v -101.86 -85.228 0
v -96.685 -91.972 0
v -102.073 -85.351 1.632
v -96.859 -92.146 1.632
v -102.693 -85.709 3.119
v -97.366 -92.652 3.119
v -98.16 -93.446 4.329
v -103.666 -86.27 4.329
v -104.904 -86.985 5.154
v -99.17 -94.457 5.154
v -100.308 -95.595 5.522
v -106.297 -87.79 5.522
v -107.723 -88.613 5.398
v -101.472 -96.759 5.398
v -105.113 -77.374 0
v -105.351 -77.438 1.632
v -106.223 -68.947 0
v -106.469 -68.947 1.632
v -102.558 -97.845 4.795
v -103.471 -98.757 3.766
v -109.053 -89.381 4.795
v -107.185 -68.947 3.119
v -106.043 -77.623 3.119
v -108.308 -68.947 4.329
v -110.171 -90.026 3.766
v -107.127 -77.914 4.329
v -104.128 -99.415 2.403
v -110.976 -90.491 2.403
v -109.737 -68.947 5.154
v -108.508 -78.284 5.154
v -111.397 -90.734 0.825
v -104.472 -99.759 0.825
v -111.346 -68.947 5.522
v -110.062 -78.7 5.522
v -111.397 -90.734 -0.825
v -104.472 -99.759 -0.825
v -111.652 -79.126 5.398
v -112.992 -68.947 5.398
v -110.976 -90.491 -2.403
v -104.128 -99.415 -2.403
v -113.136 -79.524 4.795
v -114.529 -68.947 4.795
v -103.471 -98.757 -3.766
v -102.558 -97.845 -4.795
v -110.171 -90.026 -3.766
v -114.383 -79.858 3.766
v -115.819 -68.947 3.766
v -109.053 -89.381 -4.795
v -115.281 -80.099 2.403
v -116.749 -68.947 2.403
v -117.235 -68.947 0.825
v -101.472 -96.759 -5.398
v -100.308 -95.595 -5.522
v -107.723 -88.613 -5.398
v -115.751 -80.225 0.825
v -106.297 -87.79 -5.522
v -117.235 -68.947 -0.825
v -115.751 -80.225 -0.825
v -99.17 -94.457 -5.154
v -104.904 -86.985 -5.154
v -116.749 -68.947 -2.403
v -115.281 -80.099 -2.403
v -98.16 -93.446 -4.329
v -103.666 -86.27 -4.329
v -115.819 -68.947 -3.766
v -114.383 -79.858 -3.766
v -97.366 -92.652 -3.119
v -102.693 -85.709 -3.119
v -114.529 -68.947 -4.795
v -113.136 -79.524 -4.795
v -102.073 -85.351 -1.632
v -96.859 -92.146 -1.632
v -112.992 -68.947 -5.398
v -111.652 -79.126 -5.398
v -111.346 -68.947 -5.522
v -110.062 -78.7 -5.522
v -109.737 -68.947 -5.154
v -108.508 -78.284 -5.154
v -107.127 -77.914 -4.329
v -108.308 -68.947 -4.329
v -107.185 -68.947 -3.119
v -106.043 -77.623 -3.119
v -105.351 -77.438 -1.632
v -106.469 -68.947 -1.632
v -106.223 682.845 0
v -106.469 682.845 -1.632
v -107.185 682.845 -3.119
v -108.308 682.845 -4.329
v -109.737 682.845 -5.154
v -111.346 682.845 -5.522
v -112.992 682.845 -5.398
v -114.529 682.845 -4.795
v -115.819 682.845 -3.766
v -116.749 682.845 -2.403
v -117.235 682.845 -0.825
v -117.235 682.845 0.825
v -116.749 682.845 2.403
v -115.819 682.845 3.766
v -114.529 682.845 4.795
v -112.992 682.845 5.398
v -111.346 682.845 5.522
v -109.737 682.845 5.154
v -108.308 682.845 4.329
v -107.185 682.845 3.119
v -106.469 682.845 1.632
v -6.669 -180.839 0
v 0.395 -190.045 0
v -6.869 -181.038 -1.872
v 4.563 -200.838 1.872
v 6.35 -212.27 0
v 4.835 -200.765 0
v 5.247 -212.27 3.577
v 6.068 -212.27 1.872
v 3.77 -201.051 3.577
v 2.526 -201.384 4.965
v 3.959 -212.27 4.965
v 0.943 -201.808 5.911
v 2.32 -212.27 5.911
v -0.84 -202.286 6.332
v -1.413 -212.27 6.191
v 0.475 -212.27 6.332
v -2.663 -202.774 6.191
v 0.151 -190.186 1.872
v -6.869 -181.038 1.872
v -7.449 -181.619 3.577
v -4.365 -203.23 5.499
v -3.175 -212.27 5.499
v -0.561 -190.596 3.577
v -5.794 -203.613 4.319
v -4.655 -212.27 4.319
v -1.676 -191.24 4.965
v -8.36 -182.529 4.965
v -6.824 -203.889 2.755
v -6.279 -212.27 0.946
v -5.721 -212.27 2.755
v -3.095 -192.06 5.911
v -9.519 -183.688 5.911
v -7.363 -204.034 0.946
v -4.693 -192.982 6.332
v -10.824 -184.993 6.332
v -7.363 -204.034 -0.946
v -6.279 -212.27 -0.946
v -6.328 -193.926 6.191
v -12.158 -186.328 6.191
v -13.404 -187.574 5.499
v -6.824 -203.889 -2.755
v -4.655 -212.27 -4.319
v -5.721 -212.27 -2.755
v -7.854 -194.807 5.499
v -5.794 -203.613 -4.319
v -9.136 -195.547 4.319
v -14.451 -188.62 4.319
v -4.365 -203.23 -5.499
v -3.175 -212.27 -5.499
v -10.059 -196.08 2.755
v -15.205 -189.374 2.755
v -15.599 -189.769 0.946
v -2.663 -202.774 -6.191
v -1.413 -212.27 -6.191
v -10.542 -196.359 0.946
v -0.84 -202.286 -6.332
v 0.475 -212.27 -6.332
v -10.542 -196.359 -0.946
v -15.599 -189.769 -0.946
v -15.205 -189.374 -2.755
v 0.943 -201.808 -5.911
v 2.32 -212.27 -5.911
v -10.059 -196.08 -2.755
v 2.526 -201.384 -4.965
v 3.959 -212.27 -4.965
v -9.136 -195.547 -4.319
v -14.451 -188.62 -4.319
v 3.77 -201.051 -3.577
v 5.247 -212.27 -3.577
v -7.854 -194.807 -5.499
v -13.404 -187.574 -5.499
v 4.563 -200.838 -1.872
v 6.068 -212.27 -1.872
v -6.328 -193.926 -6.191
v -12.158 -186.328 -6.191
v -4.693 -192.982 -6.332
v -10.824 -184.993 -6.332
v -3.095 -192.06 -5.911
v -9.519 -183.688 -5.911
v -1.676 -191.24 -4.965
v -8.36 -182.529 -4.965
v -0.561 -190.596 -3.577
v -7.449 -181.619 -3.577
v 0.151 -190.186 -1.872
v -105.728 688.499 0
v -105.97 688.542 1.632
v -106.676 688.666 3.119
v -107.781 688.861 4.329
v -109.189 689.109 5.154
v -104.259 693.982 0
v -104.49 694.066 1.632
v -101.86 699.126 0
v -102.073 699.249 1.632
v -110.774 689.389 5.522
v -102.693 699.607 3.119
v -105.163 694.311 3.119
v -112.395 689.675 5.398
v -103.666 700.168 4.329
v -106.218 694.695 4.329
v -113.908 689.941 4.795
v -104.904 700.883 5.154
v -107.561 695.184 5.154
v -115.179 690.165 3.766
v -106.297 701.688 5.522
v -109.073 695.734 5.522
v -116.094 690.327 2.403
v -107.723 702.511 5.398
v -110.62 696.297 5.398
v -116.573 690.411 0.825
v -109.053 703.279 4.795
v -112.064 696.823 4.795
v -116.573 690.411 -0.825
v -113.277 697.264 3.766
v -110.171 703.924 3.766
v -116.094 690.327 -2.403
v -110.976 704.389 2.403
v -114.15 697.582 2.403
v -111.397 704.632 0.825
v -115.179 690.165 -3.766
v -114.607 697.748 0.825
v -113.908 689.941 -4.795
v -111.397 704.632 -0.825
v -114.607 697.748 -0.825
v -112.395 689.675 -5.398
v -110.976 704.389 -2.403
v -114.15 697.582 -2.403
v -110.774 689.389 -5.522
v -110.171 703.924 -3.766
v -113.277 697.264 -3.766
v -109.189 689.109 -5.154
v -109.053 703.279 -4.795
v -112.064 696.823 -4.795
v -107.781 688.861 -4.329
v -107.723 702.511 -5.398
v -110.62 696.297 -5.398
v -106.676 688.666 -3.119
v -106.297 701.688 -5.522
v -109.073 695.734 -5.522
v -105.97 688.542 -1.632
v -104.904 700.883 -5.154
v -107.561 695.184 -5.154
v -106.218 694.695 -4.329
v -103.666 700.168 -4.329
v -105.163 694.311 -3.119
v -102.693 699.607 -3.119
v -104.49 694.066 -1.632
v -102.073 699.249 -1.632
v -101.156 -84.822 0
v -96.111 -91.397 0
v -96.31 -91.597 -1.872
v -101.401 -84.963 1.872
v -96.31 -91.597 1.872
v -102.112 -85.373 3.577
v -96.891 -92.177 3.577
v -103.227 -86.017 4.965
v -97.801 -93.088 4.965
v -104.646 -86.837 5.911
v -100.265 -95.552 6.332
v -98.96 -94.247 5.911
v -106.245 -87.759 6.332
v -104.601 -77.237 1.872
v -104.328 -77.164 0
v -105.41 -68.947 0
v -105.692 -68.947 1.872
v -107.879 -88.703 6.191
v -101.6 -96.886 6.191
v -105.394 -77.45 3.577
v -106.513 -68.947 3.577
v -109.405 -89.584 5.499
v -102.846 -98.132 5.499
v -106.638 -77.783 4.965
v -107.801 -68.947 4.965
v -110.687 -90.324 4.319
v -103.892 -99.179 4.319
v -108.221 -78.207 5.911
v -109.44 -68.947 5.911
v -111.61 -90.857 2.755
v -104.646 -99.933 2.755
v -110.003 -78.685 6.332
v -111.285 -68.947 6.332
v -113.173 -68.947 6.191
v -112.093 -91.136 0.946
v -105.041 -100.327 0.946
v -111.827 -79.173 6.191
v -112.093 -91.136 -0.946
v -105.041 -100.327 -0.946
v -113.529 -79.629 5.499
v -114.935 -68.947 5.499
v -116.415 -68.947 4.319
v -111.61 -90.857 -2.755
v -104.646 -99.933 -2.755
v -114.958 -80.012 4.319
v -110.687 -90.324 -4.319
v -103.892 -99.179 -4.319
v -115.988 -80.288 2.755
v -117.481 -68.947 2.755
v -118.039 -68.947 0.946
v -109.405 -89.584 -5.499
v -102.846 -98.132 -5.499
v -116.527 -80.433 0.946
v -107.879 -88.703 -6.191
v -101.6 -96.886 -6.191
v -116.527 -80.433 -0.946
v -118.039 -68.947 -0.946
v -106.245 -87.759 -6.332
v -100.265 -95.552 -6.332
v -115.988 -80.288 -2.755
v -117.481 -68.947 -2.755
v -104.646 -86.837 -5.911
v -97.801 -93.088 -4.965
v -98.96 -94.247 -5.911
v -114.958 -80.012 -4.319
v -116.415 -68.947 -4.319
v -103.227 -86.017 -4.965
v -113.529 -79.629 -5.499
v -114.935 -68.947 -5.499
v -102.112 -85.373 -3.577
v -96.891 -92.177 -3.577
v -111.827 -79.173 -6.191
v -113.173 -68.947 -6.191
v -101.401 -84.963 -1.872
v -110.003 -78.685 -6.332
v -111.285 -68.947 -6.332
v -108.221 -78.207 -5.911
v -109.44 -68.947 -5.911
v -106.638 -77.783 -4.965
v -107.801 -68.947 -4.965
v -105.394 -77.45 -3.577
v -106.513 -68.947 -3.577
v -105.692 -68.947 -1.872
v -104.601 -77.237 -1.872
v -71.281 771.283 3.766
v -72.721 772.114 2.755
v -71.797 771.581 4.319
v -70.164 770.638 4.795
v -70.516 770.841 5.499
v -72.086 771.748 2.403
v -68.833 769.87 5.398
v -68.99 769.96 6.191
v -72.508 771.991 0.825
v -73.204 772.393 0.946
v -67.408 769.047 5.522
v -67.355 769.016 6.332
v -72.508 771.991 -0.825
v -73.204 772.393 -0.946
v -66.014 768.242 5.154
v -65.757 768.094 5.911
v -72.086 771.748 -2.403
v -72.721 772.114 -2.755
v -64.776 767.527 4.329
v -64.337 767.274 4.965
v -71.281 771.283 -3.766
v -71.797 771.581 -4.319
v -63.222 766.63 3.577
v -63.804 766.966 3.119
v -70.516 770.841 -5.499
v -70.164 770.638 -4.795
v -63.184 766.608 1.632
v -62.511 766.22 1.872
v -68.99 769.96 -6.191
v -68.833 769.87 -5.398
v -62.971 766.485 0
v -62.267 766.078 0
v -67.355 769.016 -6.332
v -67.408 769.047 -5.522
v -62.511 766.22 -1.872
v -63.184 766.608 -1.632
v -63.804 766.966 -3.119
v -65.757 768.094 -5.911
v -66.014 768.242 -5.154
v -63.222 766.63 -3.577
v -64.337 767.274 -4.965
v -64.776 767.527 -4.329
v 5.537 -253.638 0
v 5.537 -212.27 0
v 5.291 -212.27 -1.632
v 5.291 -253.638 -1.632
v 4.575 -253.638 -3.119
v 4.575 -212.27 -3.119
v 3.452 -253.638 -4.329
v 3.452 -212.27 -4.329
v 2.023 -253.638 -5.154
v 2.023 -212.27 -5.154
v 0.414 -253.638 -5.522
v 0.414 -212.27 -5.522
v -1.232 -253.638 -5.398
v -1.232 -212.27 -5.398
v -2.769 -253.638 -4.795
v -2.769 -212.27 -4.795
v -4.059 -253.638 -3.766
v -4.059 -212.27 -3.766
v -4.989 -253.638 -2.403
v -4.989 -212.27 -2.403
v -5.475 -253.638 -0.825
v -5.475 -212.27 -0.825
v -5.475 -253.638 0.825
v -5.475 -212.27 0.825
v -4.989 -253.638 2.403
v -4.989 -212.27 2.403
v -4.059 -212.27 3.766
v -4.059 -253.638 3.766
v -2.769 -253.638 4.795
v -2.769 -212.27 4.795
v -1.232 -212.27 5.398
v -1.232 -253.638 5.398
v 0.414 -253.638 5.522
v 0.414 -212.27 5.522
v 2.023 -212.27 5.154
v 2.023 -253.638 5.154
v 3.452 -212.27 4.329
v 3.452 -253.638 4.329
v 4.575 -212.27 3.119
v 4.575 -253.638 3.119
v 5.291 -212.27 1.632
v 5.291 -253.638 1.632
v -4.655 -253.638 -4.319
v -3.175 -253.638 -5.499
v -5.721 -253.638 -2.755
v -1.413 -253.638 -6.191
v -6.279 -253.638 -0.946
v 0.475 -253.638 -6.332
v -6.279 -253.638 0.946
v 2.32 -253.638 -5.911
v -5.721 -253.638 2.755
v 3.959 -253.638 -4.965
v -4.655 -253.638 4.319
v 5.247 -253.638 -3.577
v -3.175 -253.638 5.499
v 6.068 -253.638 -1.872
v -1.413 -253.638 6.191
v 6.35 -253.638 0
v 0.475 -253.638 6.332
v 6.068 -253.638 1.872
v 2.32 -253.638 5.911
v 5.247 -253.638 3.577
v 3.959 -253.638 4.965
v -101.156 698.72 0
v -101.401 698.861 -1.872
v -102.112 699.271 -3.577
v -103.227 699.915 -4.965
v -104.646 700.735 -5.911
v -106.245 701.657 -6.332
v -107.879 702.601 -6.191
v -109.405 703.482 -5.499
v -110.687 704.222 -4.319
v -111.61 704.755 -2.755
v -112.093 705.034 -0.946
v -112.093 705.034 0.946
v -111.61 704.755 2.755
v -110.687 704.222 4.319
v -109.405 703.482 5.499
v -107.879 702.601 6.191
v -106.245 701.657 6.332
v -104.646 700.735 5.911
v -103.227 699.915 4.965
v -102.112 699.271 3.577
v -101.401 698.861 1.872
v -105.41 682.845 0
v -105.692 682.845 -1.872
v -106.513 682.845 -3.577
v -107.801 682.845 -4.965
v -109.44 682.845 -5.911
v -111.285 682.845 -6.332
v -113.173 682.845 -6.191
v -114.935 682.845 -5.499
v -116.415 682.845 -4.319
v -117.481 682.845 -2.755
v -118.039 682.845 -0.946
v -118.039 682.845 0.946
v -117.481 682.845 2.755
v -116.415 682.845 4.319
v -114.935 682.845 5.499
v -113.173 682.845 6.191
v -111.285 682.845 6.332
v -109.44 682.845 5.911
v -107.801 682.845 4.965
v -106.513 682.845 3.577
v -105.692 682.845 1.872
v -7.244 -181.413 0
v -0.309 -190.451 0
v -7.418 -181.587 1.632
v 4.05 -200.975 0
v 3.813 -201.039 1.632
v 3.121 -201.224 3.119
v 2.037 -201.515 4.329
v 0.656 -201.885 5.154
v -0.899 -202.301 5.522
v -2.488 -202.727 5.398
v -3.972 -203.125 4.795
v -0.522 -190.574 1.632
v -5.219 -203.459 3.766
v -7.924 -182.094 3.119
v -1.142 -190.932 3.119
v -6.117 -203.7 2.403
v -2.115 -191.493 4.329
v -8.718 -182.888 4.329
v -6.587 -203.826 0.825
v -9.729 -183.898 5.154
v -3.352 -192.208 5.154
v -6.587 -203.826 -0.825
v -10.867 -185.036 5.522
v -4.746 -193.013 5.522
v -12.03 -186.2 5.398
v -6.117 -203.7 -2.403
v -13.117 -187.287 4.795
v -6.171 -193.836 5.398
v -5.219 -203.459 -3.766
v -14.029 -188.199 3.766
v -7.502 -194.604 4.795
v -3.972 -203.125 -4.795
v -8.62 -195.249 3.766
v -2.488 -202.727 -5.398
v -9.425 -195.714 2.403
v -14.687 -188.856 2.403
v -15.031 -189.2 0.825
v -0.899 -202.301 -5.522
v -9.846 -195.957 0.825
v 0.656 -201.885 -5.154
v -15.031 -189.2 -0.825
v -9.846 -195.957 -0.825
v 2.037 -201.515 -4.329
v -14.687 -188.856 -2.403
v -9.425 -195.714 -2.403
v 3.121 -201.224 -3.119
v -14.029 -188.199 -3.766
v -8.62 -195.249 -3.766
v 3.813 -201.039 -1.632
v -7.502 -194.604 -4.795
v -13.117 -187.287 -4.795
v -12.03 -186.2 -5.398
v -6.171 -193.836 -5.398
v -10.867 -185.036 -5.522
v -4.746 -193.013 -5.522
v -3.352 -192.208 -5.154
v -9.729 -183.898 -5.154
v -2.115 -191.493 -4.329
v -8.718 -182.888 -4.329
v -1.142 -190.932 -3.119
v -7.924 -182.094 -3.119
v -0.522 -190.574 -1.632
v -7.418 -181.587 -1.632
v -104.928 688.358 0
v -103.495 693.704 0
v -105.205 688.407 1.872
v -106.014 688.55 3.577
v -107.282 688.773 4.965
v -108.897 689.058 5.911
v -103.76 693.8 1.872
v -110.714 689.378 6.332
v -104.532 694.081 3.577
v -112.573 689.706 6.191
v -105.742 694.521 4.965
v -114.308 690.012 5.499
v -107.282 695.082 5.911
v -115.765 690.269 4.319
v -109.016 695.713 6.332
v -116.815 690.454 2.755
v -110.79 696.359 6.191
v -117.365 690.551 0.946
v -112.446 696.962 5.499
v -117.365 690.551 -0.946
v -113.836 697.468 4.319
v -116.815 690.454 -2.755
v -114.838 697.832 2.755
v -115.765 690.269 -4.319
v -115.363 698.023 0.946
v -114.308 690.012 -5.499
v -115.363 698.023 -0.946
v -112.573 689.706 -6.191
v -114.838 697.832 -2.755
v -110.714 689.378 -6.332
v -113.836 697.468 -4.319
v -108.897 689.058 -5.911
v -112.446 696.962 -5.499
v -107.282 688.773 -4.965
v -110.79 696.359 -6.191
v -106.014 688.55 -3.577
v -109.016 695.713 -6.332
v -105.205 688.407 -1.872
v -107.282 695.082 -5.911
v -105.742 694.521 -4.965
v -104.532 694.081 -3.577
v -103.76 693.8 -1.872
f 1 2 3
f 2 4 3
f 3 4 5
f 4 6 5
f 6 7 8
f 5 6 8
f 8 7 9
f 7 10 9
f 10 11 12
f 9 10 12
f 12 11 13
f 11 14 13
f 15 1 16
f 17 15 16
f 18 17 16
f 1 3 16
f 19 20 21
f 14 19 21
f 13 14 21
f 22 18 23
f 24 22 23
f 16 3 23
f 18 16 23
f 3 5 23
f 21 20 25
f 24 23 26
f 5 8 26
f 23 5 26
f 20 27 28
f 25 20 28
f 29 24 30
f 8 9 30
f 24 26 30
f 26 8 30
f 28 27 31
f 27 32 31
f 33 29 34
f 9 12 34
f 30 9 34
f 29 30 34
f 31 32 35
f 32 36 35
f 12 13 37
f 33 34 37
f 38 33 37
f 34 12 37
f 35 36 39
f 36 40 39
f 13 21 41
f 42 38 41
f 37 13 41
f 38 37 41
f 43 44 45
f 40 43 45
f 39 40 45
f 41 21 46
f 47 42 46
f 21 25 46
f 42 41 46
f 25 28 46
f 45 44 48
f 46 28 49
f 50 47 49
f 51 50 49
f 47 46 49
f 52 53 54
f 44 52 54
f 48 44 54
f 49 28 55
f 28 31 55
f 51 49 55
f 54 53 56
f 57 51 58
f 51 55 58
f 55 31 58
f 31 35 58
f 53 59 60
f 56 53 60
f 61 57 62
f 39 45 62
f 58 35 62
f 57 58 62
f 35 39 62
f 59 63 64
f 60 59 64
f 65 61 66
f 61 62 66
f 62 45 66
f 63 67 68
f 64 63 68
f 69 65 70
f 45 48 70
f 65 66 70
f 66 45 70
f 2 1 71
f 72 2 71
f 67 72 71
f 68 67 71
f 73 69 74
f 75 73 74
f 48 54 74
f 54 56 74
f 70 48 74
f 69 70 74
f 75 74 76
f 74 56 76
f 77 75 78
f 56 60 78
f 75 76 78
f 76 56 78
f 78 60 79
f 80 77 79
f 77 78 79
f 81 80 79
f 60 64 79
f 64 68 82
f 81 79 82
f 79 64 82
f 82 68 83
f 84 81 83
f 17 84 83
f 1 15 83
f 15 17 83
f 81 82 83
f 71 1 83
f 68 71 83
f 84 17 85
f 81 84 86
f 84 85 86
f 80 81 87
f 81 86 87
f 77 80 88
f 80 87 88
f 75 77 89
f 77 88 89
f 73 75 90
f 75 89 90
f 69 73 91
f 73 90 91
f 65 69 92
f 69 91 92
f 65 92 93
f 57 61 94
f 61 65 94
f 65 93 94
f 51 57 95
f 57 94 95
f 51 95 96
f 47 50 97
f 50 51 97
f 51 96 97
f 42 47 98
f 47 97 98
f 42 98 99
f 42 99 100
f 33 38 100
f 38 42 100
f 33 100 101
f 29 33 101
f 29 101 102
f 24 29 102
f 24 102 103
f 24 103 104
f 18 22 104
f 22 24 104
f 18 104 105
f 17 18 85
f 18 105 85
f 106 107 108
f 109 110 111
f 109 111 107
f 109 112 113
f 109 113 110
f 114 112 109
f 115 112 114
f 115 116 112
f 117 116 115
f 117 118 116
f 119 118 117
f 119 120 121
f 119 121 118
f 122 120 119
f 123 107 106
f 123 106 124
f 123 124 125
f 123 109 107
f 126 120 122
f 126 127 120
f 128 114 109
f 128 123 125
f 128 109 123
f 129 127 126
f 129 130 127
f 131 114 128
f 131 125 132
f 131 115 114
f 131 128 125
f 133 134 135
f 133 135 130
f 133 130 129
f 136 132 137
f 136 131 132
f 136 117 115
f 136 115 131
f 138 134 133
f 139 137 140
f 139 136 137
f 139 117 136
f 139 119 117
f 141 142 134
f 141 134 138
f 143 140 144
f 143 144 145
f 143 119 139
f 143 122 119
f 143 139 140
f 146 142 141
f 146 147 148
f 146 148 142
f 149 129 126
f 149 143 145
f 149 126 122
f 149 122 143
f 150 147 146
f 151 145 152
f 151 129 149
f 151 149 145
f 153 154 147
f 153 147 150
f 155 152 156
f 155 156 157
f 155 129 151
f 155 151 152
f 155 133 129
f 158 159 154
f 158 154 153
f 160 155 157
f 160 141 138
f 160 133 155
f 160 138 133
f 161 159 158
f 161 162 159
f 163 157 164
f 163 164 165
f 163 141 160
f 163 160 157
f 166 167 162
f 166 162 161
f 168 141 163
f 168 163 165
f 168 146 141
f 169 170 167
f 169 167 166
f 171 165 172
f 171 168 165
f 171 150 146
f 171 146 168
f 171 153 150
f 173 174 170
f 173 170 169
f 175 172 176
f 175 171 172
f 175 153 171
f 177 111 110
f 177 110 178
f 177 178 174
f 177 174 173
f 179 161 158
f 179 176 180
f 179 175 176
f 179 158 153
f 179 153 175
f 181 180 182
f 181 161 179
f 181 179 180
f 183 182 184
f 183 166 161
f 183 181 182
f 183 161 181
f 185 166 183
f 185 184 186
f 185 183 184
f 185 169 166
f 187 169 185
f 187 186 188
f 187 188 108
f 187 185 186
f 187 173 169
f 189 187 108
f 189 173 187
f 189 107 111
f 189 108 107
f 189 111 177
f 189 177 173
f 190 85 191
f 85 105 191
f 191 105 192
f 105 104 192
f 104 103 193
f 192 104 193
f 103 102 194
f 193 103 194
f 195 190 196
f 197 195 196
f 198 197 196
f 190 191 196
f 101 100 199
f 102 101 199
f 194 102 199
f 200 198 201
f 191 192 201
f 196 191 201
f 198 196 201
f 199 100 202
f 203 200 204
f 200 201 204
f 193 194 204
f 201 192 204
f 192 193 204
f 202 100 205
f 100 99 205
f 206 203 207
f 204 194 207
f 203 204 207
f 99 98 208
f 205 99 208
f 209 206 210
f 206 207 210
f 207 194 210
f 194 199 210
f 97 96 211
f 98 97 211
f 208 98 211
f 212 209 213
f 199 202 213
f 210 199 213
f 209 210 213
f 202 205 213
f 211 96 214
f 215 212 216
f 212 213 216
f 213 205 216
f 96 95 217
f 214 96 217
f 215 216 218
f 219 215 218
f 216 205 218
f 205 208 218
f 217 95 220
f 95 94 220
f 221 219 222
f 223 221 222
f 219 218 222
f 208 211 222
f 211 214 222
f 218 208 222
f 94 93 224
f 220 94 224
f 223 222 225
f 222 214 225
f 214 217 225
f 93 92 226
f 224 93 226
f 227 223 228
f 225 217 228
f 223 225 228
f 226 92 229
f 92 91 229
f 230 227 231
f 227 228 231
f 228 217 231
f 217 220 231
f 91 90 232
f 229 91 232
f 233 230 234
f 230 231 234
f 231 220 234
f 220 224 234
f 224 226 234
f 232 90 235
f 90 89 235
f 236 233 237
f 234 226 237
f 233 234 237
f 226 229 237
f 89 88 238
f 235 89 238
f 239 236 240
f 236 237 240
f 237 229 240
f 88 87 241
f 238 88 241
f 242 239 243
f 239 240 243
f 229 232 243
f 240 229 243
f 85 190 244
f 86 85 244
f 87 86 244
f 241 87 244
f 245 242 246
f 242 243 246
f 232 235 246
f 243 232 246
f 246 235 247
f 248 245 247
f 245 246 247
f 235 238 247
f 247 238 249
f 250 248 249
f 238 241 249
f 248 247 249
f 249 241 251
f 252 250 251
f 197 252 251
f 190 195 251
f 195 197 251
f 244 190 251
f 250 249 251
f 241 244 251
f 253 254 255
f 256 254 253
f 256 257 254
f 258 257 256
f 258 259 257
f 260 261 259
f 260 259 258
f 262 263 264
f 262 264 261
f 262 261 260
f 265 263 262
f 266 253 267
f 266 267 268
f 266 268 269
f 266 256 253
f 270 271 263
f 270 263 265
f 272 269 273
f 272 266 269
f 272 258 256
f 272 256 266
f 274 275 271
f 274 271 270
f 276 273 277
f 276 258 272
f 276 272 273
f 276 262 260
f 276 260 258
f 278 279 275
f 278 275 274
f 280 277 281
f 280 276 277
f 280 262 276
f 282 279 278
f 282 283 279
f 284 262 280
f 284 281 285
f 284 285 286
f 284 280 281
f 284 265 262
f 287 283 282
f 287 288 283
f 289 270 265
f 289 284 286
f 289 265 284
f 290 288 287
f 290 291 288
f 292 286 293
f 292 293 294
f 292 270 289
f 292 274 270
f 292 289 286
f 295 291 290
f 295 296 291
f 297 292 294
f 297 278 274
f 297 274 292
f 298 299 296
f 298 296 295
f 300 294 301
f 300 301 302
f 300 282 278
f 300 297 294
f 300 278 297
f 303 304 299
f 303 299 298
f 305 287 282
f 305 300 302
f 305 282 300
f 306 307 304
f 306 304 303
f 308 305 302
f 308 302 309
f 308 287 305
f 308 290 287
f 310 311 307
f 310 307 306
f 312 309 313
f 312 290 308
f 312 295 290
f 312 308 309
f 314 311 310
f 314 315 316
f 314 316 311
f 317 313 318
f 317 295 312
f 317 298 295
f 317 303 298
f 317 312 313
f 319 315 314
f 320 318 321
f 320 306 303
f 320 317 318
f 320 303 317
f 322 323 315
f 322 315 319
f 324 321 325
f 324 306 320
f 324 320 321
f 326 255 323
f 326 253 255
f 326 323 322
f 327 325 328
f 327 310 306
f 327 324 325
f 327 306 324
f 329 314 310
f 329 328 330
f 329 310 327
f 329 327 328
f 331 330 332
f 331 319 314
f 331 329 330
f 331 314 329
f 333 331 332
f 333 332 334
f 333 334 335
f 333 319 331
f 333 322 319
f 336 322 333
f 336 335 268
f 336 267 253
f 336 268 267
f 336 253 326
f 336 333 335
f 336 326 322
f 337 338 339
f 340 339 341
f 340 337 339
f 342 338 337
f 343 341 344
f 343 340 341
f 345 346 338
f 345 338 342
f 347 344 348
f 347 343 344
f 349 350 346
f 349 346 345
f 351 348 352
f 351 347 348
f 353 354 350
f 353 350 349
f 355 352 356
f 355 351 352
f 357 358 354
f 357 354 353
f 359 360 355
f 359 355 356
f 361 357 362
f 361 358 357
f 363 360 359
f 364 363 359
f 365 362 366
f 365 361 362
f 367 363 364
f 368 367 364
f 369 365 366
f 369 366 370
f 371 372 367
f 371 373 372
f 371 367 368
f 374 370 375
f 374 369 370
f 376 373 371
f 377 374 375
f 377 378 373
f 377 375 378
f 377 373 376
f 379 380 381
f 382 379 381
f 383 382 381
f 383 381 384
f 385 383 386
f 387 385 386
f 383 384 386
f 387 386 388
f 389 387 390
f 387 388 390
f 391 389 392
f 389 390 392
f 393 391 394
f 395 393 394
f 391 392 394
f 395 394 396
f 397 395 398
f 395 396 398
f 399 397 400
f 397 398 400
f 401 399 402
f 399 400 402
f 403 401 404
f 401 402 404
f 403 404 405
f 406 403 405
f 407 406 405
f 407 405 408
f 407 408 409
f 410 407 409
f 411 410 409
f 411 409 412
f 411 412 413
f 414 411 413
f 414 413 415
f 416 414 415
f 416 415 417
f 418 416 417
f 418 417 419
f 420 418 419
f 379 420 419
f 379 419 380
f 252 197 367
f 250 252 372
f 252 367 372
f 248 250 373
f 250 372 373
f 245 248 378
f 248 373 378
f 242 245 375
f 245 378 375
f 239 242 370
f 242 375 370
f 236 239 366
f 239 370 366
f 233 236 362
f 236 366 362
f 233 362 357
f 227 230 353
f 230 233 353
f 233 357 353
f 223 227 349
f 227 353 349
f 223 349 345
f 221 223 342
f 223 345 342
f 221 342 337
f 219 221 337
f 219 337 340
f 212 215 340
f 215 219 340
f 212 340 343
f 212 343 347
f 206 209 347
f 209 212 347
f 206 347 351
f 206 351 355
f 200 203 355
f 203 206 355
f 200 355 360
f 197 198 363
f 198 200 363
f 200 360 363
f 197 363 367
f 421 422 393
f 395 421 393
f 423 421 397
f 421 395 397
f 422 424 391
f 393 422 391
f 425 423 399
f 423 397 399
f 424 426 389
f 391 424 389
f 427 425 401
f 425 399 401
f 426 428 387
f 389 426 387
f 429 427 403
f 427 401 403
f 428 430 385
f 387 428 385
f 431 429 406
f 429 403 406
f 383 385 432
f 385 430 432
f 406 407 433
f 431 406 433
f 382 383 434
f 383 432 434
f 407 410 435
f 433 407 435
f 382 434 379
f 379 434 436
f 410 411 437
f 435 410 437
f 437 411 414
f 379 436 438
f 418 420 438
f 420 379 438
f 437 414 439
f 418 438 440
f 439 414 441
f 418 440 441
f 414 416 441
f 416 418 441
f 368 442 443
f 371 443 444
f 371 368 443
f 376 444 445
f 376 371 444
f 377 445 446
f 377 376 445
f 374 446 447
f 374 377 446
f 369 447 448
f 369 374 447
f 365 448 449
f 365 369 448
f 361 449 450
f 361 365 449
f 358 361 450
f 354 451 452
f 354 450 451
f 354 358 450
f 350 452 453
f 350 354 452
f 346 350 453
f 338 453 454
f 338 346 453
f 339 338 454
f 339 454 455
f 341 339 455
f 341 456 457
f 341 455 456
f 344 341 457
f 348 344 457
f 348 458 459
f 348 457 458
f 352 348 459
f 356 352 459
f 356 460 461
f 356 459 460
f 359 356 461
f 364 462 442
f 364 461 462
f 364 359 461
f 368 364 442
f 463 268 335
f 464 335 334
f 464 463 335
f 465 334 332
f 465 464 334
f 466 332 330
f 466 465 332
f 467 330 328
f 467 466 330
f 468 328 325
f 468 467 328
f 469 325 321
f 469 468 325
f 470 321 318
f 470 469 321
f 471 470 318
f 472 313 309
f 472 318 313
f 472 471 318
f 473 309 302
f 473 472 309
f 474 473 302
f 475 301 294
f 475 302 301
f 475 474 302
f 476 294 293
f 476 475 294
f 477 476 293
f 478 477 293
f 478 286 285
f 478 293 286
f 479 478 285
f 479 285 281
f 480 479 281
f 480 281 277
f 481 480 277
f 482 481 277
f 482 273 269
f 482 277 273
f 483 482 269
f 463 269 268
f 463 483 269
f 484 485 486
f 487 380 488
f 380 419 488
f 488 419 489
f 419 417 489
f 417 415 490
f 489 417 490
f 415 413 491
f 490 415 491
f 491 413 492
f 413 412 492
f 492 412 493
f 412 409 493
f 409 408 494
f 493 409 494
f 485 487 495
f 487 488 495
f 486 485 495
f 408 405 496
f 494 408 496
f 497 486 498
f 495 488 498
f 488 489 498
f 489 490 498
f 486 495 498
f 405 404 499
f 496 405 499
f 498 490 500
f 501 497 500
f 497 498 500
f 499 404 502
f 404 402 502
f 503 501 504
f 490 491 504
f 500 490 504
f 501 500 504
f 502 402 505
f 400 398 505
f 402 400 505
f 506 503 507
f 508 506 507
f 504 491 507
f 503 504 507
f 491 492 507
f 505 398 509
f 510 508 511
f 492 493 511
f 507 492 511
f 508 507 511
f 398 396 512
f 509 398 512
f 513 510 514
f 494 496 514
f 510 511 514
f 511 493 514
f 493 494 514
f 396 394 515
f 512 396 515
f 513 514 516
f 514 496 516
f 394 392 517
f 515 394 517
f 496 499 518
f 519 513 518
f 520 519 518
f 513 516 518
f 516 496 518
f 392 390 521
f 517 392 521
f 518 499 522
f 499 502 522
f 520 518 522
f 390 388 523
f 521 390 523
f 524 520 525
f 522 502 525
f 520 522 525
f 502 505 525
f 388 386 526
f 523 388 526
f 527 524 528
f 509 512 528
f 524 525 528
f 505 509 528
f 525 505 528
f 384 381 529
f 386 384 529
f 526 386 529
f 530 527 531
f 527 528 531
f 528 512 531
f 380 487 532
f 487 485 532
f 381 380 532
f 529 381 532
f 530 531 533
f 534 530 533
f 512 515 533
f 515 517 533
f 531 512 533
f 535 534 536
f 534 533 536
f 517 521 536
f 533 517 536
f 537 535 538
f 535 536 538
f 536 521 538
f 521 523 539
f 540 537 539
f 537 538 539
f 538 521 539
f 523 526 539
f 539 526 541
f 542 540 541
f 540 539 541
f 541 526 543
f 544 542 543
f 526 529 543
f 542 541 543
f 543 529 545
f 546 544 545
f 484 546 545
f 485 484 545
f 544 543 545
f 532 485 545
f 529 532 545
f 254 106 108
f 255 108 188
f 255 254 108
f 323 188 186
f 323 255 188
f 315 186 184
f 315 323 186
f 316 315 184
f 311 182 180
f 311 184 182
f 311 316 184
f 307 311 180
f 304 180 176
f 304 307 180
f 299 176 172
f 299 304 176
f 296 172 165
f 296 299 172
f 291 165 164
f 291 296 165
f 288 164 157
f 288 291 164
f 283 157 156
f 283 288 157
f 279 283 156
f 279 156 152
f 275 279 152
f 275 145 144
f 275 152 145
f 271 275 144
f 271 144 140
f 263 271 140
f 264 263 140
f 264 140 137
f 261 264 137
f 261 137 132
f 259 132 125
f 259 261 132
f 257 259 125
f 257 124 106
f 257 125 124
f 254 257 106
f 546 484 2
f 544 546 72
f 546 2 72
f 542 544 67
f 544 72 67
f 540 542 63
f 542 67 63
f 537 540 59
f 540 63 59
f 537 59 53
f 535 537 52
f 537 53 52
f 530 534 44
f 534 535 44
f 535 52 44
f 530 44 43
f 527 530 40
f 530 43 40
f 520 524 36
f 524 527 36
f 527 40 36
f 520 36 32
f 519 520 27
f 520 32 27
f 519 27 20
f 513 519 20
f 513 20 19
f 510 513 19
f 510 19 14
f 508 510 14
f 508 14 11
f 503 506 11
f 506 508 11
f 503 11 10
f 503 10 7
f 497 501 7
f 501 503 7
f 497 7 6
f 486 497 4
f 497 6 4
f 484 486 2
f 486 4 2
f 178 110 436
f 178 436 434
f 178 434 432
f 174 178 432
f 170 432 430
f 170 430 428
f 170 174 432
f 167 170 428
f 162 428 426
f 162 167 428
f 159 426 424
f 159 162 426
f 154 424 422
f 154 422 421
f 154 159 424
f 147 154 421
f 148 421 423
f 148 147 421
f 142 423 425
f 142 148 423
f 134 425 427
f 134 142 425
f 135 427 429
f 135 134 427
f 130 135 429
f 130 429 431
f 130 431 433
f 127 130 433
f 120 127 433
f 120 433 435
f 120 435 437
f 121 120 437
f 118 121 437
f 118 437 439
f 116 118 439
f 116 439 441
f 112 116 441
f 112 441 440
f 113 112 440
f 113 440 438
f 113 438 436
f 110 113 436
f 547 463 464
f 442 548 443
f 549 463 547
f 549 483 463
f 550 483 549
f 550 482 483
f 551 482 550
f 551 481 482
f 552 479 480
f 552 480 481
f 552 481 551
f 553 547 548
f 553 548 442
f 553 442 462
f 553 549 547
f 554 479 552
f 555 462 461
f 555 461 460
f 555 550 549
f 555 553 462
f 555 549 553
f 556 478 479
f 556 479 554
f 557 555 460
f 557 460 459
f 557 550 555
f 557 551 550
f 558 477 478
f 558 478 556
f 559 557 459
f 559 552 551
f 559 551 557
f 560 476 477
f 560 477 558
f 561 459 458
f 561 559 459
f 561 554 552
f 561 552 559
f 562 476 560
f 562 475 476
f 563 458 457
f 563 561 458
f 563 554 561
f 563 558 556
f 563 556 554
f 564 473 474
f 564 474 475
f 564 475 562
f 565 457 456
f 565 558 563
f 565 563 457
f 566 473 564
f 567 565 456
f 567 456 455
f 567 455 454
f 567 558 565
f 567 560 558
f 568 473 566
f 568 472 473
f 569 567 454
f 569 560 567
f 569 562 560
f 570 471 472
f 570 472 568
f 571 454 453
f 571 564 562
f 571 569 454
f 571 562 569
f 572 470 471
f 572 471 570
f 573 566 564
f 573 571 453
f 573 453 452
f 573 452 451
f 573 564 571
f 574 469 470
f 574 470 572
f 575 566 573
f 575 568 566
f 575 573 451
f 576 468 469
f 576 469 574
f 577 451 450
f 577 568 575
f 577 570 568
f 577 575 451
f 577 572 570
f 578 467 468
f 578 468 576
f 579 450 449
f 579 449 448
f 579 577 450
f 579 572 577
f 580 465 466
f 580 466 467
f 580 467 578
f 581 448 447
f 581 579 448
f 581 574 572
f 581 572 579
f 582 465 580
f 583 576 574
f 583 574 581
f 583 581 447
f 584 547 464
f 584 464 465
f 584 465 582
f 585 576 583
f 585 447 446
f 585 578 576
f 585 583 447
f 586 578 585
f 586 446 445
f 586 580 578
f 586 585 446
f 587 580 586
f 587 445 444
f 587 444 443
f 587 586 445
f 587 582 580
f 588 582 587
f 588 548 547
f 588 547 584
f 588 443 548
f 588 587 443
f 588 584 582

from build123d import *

# Parameters (mm, degrees)
SKETCH2_R   = 6.35
SKETCH2_R_2 = 5.5372


with BuildPart() as part:
    # Sweep1: sweep along a path in Sketch1
    with BuildLine(Plane.XY) as sweep1_path:
        Line((0, -253.63805), (0, -212.269586726))
        ThreePointArc((0, -212.269586726), (-2.900189811, -197.689347953), (-11.159231637, -185.328818363))
        Line((-11.159231637, -185.328818363), (-100.600768363, -95.887281637))
        ThreePointArc((-100.600768363, -95.887281637), (-108.859810189, -83.526752047), (-111.76, -68.946513274))
        Line((-111.76, -68.946513274), (-111.76, 682.844622495))
        ThreePointArc((-111.76, 682.844622495), (-110.461773982, 692.705628113), (-106.655567884, 701.894622495))
        Line((-106.655567884, 701.894622495), (-67.765909488, 769.253486726))
    # Sketch2 → Sweep1 (sweep)
    with BuildSketch(Plane(origin=(0, 0, 0), x_dir=(1, 0, 0), z_dir=(0, 1, 0))):
        with Locations((-111.76, 0)):
            Circle(SKETCH2_R)
        with Locations((-111.76, 0)):
            Circle(SKETCH2_R_2, mode=Mode.SUBTRACT)
    sweep(path=sweep1_path.line)


solid = part.part
